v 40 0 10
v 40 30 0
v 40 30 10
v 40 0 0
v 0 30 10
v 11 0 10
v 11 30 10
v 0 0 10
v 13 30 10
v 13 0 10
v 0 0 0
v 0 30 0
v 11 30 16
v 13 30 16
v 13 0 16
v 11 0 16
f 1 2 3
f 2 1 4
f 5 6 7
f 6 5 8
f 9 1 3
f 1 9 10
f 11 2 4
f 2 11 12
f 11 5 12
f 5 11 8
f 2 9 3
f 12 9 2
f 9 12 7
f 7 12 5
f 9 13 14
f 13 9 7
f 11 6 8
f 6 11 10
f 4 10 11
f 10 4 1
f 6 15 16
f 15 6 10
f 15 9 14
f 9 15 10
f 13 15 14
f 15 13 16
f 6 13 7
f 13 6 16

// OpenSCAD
// units=mm — generated by scad_emitter.py
// part=unnamed
$fn = 48;

union() { cube([40, 30, 10]); translate([11, 0, 9.5]) cube([2, 30, 6.5]); }
